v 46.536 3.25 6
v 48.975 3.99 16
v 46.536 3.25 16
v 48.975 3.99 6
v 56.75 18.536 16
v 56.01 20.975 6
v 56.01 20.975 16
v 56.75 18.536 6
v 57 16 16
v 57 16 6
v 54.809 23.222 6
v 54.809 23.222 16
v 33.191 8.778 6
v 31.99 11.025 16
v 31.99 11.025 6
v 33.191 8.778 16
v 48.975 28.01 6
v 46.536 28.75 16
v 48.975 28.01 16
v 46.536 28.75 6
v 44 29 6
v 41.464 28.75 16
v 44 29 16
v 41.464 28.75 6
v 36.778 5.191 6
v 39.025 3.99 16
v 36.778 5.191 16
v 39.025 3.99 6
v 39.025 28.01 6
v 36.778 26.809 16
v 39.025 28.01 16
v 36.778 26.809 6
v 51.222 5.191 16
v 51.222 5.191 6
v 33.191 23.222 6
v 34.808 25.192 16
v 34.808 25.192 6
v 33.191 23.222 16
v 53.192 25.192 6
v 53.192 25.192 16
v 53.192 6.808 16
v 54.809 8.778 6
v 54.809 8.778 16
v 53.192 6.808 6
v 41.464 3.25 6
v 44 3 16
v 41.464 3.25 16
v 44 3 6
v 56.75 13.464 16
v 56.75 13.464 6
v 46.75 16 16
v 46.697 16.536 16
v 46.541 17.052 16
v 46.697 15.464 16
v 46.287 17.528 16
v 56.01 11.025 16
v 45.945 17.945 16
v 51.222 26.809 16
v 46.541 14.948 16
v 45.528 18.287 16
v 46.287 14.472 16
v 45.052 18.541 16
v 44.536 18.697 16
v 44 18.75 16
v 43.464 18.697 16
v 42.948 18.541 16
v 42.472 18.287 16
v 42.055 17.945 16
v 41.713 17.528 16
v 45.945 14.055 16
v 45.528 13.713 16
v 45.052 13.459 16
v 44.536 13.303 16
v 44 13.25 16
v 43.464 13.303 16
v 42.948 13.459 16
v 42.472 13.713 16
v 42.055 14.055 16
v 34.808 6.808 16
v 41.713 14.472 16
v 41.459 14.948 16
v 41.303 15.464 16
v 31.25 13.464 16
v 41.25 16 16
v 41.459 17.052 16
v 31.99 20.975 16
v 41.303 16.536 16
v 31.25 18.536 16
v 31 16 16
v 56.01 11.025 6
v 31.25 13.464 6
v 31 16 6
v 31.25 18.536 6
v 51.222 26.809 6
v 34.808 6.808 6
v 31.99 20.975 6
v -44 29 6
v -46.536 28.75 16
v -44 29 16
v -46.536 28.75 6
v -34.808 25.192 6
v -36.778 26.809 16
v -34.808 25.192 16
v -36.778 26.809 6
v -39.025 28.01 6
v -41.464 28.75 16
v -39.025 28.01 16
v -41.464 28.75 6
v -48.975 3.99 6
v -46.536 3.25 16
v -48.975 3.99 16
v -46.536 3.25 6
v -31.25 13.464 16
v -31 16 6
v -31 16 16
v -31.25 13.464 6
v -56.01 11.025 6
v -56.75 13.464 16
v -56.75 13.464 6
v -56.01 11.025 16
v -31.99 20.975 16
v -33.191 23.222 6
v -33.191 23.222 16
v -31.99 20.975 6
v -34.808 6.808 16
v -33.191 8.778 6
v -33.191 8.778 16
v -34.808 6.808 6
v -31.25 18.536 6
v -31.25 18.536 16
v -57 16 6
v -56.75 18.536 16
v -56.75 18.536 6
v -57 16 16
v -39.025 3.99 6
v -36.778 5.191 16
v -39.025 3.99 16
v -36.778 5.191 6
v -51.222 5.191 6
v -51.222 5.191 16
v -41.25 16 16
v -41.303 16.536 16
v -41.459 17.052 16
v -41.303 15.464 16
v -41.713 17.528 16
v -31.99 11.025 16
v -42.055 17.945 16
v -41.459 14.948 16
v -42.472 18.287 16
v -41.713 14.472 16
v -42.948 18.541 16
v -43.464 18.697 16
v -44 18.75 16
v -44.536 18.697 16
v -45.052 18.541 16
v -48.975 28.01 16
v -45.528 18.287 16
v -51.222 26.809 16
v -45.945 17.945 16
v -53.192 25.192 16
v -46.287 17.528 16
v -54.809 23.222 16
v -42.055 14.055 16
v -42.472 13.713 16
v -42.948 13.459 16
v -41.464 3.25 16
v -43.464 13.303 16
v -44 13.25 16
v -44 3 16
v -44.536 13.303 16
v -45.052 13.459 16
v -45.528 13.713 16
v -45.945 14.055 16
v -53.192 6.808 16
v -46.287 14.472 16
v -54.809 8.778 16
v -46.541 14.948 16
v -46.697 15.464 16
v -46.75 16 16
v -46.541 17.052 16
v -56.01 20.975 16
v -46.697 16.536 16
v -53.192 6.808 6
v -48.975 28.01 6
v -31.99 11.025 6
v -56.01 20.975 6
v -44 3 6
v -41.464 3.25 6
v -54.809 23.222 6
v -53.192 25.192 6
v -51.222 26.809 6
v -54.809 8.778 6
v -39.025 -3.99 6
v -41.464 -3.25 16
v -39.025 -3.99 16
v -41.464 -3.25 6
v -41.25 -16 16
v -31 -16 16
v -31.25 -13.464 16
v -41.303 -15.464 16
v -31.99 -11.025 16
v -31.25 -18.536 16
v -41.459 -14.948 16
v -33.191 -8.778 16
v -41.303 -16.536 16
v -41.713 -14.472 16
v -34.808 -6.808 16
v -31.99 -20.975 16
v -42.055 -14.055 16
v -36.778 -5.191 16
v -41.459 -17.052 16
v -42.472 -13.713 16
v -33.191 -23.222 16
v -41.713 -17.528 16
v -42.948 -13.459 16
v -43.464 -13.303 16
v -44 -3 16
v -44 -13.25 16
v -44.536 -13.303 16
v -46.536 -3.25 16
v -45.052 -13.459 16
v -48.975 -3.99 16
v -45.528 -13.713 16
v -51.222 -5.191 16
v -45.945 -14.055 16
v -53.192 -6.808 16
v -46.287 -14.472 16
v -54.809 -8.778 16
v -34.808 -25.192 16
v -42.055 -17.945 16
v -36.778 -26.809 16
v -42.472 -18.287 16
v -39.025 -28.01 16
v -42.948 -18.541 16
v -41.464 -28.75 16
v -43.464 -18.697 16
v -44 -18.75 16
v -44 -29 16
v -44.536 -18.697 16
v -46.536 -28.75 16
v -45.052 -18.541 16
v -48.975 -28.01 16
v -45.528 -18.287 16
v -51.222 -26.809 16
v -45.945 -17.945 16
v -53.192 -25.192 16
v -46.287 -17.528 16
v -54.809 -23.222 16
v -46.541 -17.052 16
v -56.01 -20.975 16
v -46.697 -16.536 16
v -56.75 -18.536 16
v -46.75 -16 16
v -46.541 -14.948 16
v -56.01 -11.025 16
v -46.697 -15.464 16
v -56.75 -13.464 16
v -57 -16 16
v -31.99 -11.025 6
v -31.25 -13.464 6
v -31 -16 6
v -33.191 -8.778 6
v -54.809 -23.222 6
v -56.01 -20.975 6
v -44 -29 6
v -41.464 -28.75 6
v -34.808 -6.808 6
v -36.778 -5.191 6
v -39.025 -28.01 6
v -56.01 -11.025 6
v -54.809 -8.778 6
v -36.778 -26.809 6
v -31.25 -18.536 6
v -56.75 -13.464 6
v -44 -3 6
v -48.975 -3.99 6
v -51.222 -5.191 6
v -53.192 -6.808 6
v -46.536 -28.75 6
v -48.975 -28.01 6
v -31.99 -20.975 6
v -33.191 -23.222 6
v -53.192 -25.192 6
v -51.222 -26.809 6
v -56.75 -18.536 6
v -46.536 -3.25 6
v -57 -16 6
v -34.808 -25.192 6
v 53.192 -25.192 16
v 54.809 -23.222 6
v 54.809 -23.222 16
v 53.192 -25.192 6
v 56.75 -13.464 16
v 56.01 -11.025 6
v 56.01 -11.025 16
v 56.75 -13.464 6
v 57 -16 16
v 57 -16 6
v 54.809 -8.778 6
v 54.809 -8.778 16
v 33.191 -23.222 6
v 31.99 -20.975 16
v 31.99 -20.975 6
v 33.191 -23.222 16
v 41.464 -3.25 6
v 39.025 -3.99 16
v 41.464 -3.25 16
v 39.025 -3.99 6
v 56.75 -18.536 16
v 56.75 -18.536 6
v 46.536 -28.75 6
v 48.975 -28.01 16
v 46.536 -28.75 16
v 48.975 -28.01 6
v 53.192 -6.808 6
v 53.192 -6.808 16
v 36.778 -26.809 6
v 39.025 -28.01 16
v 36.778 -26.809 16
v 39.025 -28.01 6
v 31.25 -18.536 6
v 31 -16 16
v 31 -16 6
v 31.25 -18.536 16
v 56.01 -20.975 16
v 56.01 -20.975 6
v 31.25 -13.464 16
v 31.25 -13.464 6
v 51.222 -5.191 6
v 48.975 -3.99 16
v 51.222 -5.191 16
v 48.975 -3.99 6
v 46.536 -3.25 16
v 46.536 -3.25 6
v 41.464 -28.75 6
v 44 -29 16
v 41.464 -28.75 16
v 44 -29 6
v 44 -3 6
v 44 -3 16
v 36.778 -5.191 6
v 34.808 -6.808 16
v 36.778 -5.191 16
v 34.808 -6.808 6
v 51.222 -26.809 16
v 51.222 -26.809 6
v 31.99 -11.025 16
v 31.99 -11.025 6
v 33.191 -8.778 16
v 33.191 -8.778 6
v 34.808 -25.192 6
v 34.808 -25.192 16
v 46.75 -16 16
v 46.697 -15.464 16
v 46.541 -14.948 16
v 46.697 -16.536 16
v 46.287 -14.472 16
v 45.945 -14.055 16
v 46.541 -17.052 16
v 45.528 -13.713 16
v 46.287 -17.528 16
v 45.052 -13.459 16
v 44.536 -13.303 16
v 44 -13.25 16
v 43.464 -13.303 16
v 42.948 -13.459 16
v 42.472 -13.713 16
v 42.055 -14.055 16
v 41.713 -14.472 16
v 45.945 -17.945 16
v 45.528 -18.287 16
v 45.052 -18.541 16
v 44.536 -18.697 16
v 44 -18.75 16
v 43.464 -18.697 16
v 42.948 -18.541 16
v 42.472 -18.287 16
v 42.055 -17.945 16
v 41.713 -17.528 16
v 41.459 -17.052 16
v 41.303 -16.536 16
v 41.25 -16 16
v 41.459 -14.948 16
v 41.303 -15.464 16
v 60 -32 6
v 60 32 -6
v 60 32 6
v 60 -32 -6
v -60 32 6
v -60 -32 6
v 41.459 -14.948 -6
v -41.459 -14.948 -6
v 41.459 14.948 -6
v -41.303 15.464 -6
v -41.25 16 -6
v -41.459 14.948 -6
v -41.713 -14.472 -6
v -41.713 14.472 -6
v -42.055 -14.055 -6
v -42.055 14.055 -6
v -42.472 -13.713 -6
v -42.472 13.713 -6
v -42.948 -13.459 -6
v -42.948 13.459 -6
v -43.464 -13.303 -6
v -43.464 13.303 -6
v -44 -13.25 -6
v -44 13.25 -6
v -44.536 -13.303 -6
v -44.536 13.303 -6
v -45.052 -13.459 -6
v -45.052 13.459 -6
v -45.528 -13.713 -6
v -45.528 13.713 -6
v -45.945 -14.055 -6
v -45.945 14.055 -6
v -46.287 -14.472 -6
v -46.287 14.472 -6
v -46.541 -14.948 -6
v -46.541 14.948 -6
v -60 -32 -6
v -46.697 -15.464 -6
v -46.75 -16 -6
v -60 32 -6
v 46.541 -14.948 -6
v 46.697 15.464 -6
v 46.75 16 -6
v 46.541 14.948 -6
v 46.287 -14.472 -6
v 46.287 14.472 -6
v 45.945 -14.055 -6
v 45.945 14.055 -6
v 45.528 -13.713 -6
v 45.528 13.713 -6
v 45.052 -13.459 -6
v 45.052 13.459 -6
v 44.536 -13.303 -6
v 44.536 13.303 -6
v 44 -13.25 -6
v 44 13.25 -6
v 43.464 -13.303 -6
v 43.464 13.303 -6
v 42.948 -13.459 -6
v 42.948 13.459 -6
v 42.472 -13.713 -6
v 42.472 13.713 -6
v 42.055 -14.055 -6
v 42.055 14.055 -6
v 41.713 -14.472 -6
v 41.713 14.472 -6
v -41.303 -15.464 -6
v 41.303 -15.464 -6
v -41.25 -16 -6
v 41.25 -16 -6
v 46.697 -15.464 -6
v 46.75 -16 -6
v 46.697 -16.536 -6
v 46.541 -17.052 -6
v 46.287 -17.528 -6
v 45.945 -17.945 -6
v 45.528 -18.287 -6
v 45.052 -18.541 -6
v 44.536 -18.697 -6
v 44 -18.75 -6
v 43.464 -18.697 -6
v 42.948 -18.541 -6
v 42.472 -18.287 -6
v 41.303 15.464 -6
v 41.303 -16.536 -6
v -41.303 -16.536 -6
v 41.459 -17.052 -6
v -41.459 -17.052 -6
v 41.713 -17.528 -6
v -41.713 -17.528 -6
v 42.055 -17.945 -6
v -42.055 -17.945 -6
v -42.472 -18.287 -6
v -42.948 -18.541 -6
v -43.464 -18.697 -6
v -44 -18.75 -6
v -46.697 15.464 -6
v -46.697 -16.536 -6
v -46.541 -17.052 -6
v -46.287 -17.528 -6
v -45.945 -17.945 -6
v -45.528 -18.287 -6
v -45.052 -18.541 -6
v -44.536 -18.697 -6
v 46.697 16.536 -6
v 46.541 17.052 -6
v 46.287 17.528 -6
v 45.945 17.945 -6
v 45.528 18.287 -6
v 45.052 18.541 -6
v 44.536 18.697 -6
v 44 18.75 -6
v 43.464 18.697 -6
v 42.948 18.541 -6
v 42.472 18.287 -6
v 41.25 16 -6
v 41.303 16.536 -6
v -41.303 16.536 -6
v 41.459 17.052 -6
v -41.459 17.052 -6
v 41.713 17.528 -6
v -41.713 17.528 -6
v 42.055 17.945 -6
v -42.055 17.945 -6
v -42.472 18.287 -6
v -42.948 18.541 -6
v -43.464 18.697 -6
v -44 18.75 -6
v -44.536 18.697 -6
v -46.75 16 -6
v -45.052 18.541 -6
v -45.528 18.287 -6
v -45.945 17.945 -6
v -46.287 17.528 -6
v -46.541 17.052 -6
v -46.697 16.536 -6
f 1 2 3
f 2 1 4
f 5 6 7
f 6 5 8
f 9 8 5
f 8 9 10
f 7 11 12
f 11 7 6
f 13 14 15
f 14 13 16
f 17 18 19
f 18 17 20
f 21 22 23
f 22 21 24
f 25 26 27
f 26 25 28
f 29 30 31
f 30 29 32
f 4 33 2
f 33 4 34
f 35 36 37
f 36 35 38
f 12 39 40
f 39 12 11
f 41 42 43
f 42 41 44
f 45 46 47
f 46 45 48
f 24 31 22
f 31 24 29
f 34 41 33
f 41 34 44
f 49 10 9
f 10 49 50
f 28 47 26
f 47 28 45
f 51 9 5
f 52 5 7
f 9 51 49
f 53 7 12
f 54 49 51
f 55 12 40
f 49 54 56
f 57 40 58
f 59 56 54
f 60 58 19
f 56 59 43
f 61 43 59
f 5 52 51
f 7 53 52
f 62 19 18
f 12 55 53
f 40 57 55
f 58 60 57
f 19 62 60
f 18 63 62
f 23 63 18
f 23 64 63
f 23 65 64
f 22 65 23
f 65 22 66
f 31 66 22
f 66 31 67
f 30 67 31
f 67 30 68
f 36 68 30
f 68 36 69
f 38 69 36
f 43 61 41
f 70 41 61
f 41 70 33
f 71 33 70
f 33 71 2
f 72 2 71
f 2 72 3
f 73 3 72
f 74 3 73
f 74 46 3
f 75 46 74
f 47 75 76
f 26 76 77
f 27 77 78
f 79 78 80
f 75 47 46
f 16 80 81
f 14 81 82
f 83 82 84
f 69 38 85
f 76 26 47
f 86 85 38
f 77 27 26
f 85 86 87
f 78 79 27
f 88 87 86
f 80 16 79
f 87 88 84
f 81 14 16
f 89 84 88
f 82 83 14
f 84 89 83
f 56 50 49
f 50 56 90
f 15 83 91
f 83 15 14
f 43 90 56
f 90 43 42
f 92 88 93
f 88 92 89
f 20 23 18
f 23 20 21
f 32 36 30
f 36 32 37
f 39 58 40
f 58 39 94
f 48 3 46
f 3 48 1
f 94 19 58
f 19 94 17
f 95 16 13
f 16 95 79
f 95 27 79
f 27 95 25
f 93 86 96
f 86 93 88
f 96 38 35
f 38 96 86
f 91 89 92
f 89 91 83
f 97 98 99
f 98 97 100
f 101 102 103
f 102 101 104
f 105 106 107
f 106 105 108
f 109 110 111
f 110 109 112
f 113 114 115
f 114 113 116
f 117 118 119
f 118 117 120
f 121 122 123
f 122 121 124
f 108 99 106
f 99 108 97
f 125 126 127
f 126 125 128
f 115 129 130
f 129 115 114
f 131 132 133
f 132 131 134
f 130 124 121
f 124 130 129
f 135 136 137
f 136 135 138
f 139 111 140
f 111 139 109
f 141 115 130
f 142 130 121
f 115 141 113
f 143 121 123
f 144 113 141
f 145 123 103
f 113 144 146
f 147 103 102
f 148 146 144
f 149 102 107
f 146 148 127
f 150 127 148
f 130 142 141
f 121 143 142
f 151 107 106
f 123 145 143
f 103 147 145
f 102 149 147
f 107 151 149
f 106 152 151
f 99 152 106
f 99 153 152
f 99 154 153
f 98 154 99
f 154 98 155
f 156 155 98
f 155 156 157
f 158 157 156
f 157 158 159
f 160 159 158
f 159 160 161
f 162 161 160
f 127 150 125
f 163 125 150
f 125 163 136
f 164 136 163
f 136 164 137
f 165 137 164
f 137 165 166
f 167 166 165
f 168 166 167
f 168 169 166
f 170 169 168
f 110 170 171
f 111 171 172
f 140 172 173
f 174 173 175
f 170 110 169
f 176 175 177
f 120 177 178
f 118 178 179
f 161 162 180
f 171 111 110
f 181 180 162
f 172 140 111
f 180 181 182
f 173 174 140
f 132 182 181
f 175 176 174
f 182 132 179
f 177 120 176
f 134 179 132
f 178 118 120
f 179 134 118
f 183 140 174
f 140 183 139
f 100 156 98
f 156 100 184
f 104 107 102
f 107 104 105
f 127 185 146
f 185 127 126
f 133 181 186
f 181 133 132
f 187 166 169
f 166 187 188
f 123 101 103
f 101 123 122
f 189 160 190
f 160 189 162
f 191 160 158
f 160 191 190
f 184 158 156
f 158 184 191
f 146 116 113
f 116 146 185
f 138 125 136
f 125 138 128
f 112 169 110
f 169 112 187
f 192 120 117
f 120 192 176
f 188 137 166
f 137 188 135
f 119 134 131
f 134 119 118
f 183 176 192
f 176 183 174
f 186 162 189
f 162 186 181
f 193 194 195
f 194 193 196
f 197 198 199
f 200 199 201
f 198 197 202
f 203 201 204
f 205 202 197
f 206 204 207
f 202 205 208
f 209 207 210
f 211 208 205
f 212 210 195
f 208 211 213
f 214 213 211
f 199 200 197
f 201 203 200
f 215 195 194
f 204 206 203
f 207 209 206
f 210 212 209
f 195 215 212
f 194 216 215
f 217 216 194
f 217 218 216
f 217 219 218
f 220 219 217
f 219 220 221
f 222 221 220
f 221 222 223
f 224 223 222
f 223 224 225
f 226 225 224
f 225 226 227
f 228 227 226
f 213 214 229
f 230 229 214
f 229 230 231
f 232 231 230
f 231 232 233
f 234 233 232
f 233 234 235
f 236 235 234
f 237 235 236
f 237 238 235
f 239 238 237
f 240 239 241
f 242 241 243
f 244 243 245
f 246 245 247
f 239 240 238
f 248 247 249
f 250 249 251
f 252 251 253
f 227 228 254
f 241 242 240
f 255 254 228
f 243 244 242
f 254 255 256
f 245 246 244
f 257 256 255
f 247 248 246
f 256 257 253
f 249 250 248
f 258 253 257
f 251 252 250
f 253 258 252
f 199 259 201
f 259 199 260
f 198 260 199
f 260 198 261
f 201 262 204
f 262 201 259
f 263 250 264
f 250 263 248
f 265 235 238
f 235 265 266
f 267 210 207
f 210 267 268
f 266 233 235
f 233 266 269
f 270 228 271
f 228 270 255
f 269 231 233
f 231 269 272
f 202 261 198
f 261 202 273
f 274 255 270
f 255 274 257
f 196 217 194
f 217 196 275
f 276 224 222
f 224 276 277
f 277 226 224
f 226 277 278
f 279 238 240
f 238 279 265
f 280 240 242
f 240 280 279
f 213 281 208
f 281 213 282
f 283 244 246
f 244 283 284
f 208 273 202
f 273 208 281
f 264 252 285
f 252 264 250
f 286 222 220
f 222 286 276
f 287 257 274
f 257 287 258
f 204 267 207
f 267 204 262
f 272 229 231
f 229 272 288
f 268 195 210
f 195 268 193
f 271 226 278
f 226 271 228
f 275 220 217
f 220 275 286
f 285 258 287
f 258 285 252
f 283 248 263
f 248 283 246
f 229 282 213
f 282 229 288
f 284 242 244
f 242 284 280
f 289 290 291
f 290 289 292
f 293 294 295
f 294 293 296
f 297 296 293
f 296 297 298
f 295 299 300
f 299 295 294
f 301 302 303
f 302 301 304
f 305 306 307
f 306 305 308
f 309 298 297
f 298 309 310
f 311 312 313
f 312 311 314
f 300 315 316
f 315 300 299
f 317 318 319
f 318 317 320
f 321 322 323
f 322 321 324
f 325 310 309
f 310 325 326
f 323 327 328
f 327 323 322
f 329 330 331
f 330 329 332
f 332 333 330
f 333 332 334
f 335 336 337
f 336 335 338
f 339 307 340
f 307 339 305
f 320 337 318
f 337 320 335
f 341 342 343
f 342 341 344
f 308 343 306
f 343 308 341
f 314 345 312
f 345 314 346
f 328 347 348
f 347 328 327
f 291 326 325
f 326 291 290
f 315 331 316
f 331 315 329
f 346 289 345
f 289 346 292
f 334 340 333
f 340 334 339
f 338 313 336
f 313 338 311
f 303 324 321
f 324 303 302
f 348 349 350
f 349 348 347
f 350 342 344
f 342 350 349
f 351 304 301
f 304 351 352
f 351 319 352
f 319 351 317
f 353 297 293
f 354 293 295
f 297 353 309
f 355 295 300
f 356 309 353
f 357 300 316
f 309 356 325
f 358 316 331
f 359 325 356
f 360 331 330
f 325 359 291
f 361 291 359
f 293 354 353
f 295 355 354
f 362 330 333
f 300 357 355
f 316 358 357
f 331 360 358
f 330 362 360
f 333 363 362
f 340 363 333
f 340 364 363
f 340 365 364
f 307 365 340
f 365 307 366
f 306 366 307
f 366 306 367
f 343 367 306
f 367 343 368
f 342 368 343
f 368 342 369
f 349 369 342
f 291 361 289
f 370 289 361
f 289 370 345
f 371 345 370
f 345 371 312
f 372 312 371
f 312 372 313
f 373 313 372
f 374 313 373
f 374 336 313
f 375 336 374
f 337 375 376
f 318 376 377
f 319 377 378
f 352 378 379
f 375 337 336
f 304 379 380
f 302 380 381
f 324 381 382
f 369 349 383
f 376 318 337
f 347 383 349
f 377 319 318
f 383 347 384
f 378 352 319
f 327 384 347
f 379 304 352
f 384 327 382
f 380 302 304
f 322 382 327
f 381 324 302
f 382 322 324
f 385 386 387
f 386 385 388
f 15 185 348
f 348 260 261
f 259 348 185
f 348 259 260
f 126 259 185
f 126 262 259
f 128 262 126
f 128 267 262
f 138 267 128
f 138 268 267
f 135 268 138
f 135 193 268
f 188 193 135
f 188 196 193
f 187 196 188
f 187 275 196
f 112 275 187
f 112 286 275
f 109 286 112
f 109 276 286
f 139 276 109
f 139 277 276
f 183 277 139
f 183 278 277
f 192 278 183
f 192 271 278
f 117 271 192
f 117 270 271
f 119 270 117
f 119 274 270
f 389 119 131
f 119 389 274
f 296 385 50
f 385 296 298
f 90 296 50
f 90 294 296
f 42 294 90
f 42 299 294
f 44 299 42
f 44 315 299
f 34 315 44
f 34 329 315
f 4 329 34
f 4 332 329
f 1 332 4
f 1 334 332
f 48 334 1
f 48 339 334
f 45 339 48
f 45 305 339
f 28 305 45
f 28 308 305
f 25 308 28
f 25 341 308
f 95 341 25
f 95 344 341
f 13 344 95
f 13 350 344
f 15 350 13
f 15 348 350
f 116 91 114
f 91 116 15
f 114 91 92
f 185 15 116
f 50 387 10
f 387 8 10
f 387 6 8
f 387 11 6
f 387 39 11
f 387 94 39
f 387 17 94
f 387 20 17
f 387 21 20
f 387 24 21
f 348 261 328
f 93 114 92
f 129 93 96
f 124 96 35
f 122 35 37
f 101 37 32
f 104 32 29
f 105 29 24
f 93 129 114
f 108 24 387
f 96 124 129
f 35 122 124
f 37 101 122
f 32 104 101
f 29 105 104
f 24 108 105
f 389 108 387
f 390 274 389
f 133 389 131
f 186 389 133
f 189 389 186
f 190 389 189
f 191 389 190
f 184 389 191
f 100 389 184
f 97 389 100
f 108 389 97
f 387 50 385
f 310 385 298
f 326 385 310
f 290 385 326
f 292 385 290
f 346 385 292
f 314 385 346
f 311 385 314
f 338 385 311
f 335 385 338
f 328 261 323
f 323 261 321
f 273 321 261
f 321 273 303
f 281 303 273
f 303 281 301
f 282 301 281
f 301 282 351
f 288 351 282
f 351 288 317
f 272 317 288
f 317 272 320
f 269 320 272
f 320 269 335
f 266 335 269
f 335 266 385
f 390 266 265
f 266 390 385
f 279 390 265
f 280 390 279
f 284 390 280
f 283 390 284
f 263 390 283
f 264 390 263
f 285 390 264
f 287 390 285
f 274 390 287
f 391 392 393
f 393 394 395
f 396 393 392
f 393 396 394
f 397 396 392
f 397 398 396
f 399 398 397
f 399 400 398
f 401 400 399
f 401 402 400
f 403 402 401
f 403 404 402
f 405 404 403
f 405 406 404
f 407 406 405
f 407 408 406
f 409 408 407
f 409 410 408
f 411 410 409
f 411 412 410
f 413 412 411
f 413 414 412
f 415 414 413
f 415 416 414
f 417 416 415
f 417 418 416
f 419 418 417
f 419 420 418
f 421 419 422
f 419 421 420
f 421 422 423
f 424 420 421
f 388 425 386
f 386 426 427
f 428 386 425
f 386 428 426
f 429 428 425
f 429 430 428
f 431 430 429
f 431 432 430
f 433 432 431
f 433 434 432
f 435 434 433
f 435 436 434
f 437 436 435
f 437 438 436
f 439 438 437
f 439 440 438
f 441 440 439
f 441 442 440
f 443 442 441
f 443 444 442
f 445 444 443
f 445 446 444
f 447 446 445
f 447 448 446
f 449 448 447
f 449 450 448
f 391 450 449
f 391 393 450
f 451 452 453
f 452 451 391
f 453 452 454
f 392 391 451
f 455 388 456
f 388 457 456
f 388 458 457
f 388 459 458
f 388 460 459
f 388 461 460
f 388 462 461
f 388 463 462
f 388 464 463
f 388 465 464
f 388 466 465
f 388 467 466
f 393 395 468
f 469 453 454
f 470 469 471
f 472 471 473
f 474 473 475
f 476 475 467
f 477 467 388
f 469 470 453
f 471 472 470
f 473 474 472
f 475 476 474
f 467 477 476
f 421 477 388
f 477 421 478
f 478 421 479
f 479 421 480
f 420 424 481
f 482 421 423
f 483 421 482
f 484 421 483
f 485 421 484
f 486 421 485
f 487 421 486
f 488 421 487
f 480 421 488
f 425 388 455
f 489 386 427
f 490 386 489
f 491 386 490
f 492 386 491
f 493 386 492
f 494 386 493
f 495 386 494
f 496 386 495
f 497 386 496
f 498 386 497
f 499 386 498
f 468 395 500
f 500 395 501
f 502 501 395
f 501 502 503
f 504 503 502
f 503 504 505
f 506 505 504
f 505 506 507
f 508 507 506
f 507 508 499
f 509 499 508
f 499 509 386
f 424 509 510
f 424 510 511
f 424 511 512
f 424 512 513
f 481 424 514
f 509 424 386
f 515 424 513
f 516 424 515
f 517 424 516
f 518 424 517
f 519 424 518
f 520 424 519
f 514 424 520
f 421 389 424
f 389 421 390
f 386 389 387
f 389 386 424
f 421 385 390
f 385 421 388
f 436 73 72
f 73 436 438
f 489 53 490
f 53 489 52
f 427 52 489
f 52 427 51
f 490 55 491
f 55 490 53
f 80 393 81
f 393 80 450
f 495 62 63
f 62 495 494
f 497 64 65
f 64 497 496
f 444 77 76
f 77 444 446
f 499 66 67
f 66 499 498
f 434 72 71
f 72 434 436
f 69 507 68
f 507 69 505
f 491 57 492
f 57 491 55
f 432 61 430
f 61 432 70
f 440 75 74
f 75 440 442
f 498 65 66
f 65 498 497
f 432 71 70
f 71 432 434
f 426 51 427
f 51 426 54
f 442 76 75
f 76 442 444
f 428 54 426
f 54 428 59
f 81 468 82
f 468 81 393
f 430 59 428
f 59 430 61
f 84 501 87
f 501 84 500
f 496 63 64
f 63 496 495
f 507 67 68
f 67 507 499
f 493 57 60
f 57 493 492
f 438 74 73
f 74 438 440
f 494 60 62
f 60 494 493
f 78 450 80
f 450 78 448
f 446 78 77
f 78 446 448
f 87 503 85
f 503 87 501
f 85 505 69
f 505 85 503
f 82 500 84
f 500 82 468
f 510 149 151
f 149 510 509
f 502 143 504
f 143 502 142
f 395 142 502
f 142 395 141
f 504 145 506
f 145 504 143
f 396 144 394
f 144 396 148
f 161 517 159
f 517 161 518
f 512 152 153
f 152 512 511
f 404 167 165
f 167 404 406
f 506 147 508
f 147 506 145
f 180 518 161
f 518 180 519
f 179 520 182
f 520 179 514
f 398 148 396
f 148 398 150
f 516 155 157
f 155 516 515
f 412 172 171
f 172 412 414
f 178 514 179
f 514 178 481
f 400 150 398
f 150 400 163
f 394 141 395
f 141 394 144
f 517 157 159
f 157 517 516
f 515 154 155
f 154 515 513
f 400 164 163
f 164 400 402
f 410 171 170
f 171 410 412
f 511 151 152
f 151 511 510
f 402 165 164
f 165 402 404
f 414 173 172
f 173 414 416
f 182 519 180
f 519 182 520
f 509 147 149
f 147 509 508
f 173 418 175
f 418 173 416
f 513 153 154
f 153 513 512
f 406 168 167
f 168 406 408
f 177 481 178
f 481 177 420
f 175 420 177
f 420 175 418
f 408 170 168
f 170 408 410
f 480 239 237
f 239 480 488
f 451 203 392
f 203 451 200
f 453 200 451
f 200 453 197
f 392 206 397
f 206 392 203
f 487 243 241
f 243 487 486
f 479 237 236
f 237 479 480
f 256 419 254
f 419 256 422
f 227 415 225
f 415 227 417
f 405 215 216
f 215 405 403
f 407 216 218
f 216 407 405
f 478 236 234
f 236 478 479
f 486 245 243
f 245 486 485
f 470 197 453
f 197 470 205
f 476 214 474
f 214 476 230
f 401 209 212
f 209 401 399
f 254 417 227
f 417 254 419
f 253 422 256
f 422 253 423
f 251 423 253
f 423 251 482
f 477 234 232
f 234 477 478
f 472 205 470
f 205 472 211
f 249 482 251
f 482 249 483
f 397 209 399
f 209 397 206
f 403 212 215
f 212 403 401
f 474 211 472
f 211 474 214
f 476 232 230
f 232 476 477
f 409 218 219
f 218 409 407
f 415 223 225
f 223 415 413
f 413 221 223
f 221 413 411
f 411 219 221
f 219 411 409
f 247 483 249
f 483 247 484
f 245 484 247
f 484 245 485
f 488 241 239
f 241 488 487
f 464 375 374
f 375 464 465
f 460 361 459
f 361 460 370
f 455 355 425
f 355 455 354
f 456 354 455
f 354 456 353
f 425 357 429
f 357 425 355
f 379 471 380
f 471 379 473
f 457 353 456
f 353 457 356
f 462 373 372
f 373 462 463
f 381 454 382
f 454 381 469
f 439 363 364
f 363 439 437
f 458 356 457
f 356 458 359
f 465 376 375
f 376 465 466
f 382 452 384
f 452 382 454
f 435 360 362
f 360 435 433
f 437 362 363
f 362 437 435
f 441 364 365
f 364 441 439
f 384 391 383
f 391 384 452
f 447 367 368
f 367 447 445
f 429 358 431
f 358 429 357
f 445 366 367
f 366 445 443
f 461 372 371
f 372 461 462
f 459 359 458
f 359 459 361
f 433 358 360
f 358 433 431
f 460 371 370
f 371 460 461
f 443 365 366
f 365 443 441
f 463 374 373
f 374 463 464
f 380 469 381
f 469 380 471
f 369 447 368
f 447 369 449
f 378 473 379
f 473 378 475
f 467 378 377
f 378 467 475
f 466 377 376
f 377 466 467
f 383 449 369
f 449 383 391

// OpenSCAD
$fn = 32;

// ----------------------------------------------------------------------
// Anchor pads 120 x 64 x 22
// four corner bosses with anchor holes
// ----------------------------------------------------------------------

// --- parameters (mm) ---
plate = [120, 64, 12];  // base plate size (x, y, z)
pads = 4;               // boss count, one per corner
edge = 16;              // boss centre offset from the plate edge
boss_d = 26;            // boss diameter
boss_h = 10;            // boss height above the base plate
hole_d = 5.5;           // hole diameter

// --- derived feature positions (mm) ---
height = plate[2] + boss_h;      // = 22   overall height of the part
corner_x = plate[0] / 2 - edge;  // = 44   boss centre X
corner_y = plate[1] / 2 - edge;  // = 16   boss centre Y
feature_centers = [
  [corner_x, corner_y],
  [-corner_x, corner_y],
  [-corner_x, -corner_y],
  [corner_x, -corner_y]
];   // boss centres, anchor holes are drilled there

// base plate, four bosses standing on it, anchor holes all the way through
difference() {
  union() {
    cube(plate, center = true);
    for (centre = feature_centers)
      translate([centre[0], centre[1], plate[2] / 2 - 1])
        cylinder(d = boss_d, h = boss_h + 1);
  }
  for (centre = feature_centers)
    translate([centre[0], centre[1], -height])
      cylinder(d = hole_d, h = 2 * height + 2);  // through boss and plate
}
